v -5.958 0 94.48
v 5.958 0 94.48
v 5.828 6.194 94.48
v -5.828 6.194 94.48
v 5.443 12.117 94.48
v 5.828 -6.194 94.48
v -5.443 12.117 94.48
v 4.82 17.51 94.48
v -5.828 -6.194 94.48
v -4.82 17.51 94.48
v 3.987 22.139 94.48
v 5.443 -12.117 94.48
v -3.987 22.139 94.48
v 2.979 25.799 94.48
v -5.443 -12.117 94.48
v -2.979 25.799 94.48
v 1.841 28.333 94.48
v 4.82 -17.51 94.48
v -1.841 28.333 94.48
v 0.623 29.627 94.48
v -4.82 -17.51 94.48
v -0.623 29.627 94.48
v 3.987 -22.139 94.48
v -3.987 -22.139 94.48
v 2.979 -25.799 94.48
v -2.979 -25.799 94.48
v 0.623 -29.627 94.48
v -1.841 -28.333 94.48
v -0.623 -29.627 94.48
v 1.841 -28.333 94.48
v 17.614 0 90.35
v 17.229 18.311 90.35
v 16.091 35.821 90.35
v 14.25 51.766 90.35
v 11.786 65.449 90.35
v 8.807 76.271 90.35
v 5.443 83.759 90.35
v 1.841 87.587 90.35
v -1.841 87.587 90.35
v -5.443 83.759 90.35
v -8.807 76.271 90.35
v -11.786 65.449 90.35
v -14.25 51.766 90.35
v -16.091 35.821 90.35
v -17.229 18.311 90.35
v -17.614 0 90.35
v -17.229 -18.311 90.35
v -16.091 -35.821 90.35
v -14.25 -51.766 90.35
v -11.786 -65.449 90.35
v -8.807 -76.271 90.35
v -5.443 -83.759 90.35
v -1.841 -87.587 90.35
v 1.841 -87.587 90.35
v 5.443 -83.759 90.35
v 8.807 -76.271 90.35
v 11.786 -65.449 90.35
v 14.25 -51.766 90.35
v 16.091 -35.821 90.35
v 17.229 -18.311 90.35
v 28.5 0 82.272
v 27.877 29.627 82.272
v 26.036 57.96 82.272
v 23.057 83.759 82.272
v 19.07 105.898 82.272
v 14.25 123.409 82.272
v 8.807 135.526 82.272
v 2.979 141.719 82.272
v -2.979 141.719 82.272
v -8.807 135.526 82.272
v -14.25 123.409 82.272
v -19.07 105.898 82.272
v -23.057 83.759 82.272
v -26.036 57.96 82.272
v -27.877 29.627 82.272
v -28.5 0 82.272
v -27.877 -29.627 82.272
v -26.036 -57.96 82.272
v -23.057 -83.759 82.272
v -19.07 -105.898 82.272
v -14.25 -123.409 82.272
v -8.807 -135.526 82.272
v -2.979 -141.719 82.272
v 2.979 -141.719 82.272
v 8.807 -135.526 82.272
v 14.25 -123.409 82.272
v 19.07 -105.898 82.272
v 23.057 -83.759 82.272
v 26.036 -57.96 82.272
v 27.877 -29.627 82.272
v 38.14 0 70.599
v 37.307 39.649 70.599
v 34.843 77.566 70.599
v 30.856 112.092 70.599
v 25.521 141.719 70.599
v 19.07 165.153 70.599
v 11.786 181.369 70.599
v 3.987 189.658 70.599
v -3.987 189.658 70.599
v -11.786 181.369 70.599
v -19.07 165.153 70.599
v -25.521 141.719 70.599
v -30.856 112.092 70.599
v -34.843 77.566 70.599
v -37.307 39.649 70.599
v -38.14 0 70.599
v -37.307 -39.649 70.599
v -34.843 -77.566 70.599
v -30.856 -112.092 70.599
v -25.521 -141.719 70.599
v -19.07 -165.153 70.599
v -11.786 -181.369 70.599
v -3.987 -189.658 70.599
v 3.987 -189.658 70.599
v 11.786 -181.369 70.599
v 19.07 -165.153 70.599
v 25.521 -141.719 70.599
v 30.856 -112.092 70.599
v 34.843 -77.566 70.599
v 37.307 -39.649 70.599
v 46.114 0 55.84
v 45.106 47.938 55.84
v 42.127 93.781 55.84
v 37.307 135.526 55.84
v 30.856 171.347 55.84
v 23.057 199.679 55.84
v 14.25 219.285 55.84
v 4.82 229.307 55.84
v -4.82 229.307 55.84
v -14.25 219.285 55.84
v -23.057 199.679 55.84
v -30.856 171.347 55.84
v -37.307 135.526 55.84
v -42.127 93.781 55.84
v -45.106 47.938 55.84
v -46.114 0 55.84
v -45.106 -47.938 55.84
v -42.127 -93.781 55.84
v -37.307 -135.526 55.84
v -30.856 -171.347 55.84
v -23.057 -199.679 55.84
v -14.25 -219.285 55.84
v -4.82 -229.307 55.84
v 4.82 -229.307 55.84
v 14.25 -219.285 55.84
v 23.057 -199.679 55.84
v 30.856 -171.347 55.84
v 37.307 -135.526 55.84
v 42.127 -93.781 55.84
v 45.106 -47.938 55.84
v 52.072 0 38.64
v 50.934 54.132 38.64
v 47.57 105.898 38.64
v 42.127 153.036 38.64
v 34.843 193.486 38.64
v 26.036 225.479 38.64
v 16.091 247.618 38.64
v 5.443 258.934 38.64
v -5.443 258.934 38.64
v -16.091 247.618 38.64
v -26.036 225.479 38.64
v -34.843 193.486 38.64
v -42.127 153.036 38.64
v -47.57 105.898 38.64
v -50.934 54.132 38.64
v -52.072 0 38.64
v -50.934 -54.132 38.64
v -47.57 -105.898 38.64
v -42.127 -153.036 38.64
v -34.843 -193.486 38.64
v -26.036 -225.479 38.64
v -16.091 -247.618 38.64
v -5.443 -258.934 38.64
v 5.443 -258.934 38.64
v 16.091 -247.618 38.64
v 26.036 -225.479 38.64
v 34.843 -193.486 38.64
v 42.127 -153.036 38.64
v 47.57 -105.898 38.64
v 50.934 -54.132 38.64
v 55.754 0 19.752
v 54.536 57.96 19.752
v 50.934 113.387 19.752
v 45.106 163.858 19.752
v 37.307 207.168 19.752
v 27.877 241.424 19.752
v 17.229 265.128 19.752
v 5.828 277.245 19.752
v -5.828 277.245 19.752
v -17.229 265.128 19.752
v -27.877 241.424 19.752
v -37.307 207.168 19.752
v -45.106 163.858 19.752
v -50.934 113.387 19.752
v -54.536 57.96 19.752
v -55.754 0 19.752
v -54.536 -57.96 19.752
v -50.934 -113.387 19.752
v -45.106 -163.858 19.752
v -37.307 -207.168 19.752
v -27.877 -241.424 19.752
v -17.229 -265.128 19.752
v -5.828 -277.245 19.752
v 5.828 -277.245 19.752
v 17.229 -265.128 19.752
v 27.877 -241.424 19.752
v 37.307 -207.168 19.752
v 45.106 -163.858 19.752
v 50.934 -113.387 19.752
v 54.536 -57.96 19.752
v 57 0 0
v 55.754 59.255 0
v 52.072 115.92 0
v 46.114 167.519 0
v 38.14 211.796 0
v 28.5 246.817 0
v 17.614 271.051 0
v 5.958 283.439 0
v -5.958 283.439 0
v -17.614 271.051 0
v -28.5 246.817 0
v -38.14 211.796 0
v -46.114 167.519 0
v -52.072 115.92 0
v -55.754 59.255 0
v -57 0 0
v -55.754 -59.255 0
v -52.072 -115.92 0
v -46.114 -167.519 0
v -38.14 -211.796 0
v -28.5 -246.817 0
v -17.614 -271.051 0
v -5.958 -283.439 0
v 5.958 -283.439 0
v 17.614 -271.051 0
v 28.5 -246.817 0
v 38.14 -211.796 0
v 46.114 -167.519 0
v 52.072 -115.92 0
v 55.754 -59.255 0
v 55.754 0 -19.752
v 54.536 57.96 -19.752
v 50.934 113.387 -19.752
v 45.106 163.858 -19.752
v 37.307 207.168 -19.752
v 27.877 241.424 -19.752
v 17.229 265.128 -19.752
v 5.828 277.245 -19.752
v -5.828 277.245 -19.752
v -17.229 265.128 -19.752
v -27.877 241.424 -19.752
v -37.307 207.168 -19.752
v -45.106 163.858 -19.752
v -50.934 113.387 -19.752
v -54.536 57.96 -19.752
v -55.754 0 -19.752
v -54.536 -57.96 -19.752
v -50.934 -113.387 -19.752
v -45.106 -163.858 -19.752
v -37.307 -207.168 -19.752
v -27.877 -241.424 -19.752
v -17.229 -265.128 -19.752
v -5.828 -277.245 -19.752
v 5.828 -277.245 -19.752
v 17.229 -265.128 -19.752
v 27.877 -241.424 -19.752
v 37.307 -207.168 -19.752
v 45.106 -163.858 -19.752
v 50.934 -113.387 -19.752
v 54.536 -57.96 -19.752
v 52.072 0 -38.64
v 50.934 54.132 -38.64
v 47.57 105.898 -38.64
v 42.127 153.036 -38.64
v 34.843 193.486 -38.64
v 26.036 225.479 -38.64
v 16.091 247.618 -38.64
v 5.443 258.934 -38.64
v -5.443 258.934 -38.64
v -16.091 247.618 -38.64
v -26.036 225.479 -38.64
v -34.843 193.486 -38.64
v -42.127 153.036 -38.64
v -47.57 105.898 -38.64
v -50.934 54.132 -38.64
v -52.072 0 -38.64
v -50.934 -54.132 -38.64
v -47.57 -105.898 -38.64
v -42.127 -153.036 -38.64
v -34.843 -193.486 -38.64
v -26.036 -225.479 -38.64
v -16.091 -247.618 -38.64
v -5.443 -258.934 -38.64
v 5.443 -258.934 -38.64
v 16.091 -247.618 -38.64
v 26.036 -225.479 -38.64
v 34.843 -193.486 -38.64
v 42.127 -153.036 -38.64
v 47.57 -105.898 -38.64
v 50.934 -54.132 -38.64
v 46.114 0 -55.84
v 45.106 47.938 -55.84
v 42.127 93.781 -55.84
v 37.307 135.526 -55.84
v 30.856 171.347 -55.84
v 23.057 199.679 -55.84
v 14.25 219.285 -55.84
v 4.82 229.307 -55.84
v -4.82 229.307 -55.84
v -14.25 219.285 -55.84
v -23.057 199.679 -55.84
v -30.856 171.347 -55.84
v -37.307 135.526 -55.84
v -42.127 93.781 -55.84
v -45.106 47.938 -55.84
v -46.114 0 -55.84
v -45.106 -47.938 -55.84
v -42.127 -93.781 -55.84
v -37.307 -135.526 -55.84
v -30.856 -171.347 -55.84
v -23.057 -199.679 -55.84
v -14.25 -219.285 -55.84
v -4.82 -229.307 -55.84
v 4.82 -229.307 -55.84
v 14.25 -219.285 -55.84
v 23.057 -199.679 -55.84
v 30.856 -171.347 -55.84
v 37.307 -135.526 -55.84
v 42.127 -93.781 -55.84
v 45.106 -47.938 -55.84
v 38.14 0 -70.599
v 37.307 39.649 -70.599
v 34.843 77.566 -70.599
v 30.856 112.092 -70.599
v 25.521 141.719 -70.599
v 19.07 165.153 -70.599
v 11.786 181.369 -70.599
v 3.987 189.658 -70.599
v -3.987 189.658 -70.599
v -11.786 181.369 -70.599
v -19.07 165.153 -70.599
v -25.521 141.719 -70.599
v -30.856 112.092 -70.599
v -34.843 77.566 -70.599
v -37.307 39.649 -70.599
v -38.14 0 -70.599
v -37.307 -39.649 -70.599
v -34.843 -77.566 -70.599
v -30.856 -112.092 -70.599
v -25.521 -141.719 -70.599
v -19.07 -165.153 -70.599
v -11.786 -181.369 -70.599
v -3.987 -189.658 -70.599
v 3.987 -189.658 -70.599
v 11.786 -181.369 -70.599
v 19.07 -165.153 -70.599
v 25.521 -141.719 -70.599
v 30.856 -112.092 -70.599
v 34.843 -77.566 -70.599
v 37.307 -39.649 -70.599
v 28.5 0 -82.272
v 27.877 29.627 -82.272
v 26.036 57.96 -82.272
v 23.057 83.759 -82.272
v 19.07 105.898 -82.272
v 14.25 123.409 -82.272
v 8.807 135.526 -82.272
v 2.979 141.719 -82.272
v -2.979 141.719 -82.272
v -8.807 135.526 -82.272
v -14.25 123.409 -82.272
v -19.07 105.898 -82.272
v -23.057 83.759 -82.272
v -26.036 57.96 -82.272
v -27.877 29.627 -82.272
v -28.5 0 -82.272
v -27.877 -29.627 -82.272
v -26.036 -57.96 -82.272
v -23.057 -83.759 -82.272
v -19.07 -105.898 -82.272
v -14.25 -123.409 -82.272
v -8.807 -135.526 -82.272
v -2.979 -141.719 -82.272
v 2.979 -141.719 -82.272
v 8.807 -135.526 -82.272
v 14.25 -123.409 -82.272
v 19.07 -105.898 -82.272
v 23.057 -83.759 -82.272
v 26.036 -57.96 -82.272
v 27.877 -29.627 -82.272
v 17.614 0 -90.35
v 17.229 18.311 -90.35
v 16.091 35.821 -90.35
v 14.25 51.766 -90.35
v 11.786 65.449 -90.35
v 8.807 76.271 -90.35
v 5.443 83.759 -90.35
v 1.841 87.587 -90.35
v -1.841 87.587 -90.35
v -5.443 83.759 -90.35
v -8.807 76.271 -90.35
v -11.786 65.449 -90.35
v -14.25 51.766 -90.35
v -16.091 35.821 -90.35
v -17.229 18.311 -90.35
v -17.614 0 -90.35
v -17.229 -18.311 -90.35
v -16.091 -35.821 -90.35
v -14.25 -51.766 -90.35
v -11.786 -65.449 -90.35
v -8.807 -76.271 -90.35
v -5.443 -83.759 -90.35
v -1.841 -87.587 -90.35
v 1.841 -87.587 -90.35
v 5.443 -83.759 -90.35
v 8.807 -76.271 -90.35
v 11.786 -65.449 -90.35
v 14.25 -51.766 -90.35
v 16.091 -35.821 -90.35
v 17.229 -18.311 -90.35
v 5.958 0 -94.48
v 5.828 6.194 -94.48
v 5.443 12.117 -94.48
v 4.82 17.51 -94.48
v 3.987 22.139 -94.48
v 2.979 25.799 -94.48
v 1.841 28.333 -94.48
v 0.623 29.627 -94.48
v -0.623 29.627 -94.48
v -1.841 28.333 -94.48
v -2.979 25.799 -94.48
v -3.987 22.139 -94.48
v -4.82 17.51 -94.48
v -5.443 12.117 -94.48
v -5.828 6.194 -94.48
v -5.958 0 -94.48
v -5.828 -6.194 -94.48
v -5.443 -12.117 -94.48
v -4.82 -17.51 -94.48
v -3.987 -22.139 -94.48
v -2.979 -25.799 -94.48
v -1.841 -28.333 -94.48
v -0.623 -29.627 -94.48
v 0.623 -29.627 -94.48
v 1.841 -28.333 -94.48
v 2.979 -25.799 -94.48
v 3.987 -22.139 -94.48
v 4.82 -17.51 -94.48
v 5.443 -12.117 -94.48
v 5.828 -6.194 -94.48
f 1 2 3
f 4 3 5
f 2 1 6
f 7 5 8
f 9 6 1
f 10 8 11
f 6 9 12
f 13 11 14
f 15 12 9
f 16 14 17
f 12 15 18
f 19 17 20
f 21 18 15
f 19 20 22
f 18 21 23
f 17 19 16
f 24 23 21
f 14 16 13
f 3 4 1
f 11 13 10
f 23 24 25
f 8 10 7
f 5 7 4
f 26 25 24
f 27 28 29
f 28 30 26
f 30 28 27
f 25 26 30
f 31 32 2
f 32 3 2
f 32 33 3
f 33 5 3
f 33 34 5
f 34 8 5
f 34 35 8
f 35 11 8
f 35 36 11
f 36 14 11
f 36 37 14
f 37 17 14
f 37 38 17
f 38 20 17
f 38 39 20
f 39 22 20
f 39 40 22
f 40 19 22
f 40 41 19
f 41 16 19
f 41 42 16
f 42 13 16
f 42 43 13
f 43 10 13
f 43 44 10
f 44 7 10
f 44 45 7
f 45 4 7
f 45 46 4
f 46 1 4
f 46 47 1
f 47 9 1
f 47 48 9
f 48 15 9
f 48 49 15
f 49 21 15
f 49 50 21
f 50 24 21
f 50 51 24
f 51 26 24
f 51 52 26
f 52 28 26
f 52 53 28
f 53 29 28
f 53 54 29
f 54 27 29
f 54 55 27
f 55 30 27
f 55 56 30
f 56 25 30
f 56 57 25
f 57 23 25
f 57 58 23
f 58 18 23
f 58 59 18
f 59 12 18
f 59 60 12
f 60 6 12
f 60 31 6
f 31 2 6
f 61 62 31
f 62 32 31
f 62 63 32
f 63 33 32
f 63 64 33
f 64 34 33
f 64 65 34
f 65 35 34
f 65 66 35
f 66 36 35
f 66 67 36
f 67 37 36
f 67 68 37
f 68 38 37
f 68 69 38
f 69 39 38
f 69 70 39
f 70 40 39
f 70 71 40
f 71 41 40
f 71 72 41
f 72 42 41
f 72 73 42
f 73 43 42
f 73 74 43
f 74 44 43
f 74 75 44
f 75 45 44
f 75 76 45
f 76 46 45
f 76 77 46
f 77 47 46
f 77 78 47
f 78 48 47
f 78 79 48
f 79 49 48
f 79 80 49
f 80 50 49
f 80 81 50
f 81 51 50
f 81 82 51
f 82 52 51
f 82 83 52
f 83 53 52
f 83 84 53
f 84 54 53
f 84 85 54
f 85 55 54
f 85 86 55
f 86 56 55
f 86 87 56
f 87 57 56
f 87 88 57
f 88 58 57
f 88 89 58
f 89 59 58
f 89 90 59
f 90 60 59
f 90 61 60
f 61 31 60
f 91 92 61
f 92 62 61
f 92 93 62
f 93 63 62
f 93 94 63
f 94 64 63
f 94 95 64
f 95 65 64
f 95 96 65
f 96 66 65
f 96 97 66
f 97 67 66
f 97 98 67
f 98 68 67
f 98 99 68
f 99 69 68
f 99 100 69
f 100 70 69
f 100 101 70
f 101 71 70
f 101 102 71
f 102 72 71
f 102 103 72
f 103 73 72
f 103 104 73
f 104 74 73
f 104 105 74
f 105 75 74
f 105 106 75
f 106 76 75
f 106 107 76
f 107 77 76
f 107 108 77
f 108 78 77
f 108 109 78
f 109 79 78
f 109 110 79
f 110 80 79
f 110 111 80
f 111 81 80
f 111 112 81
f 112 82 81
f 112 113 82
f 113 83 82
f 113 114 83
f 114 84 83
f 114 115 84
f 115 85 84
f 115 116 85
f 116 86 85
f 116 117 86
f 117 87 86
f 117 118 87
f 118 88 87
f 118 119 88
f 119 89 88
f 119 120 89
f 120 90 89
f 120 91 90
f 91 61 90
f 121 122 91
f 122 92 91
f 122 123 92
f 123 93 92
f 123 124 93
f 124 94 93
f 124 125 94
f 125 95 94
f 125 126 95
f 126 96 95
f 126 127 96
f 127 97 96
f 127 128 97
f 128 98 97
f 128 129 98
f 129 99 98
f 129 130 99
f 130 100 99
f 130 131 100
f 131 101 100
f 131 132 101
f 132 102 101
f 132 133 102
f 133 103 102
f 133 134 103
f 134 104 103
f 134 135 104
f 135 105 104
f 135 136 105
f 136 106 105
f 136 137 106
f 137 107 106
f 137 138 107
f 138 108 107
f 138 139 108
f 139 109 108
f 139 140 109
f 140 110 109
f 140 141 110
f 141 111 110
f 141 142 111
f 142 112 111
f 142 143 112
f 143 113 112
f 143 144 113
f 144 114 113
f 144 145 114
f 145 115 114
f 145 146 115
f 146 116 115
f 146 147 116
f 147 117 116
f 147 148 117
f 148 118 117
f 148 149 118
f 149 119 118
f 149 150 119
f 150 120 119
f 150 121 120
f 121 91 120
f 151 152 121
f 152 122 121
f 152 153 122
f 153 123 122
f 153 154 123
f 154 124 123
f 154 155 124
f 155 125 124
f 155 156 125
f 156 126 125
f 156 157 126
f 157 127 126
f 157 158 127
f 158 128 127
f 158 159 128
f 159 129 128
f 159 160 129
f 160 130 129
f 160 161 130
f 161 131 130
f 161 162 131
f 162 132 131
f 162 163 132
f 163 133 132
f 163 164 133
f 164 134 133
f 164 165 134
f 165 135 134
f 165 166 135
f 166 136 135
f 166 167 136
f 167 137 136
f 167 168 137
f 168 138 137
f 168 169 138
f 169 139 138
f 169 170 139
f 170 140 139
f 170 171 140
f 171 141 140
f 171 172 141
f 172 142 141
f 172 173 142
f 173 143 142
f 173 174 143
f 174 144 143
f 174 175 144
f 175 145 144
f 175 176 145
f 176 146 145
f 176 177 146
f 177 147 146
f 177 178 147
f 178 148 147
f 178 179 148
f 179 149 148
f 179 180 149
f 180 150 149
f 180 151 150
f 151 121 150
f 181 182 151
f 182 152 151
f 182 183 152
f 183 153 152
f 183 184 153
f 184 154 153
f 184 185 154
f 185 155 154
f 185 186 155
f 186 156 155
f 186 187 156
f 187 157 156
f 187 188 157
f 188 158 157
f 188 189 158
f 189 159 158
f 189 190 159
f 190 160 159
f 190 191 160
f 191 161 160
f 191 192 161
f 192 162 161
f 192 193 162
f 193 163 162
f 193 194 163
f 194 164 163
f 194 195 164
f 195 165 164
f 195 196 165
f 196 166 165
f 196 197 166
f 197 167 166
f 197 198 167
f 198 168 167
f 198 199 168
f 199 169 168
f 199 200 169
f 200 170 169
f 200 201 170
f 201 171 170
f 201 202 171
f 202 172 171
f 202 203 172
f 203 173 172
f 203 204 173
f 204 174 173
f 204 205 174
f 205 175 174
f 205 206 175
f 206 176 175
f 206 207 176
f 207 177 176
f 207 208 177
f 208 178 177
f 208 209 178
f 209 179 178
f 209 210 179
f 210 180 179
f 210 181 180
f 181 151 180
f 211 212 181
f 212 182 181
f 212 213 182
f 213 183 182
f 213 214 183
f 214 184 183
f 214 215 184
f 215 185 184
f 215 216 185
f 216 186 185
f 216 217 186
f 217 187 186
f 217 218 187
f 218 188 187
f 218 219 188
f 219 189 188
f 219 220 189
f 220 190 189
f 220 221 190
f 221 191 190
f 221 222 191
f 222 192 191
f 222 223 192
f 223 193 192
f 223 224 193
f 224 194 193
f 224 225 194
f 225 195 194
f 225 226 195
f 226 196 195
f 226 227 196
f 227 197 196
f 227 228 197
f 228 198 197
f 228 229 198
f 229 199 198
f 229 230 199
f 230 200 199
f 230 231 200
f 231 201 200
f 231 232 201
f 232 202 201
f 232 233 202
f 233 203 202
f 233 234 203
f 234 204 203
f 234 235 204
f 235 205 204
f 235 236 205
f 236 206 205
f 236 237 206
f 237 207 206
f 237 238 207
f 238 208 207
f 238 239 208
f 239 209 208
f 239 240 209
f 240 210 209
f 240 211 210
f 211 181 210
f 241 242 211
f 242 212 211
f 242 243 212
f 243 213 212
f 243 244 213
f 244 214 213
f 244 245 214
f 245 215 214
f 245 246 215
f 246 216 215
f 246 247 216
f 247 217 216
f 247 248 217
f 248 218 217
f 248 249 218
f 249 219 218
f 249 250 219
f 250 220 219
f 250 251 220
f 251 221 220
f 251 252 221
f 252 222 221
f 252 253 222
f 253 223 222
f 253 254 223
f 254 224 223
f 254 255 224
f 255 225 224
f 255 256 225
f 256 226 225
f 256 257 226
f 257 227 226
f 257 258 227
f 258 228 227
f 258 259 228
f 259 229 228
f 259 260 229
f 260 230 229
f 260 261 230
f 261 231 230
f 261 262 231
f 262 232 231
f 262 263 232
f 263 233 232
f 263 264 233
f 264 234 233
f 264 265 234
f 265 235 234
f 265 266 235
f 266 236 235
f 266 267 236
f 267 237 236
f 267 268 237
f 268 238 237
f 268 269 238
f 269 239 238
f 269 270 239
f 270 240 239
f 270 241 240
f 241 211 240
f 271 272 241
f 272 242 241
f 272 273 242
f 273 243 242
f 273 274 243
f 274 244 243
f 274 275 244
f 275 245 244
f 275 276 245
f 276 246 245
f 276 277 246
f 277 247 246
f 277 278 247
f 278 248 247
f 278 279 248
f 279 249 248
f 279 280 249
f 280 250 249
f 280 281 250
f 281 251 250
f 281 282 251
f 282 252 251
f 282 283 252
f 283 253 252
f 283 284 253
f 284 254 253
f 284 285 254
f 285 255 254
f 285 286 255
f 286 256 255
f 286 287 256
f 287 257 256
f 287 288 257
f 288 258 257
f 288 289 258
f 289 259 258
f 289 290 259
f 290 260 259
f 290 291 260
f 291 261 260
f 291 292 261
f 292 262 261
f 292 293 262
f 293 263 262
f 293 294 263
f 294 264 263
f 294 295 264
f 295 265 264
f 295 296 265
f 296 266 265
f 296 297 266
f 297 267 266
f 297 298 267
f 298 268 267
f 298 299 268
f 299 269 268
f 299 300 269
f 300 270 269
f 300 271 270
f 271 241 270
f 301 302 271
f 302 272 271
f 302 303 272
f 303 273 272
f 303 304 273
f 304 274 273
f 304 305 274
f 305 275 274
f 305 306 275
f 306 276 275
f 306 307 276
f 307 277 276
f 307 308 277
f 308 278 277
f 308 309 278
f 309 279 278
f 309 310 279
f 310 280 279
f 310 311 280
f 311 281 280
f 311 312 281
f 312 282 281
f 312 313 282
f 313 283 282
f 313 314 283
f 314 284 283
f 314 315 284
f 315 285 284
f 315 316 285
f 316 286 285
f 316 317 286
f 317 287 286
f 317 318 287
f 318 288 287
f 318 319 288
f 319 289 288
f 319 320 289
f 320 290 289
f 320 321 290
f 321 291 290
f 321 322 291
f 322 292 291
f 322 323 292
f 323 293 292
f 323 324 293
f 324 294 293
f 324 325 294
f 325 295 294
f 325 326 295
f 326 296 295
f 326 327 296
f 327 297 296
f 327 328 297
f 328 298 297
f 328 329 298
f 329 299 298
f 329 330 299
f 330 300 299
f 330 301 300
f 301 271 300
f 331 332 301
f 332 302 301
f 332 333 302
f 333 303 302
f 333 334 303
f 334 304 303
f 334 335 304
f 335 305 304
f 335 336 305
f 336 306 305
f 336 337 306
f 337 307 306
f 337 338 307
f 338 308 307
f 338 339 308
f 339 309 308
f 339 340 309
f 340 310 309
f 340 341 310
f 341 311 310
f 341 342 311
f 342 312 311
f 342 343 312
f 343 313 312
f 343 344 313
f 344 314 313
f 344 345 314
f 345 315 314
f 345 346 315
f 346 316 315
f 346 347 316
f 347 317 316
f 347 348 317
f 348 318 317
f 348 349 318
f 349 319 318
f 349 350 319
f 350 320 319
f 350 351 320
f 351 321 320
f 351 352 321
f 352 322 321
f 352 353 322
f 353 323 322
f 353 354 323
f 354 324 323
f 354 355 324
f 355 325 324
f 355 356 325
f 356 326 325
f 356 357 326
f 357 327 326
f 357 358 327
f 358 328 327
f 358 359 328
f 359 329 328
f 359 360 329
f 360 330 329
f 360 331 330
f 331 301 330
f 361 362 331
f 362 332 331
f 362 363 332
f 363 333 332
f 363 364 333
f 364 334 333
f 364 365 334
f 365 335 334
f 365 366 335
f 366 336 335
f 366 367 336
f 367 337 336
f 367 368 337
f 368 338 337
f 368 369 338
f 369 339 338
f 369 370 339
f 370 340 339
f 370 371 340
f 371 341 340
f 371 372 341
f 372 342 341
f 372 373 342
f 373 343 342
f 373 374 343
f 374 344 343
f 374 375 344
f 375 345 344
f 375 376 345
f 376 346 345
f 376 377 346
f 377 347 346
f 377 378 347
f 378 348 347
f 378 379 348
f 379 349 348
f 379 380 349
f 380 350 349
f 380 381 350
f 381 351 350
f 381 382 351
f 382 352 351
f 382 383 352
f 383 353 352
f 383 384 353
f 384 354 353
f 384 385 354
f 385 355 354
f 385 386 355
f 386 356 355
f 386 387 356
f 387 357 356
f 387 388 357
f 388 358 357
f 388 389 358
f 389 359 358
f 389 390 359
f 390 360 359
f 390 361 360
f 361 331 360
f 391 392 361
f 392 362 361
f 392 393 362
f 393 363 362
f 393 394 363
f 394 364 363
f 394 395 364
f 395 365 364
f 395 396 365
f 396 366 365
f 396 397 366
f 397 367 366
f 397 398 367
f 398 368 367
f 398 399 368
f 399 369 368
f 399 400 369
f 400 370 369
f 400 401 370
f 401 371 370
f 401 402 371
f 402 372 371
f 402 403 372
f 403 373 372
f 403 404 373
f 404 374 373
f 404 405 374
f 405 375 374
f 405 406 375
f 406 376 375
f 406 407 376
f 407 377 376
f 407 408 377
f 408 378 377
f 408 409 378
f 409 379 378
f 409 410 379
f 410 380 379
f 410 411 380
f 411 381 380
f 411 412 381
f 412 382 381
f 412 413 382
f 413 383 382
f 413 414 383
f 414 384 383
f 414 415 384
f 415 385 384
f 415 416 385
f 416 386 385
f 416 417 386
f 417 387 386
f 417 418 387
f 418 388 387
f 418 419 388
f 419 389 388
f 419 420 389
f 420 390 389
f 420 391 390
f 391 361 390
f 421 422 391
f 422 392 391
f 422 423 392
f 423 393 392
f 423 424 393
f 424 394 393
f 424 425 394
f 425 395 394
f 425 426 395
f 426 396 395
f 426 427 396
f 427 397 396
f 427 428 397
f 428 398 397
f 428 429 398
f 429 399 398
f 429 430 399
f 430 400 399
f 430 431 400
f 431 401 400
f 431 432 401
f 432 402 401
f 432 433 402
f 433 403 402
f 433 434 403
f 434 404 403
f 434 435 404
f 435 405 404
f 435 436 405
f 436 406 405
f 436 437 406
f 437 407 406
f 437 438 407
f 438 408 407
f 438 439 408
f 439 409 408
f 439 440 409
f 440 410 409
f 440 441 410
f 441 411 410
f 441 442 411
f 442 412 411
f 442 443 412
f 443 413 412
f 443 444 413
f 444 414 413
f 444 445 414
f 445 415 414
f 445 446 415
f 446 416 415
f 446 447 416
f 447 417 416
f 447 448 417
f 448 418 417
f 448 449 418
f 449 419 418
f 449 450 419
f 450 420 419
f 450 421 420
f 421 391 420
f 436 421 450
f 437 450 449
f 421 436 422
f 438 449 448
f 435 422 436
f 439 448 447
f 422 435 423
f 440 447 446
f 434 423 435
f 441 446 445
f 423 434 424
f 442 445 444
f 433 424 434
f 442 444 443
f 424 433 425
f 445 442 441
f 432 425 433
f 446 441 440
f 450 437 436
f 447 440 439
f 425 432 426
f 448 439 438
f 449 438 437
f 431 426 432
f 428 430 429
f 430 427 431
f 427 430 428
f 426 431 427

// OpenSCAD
// Generated by SolidPython 1.0.1 on 2020-07-29 00:46:45


scale(v = [3, 15, 5]) {
	sphere(r = 19);
}
/***********************************************
*********      SolidPython code:      **********
************************************************
 
# import packages: SolidPython
from solid import *
from solid.utils import *
from itertools import chain, combinations, permutations


class Resize:

    def __init__(self, scad_file):
        self.scad_file = scad_file
        #self.scad_file = import_scad(scad_file)
        # cone/cylinder param:
        self.r1 = 0
        self.r2 = 0
        self.h = 0
        # rectangular prism param:
        self.w = 0
        self.l = 0
        # ellipse param:
        self.r = 0

    # import OpenScad code (file name corresponds to shape)


    # classify shape + parameters
    def assign(self, param1, param2, param3):
        if self.scad_file == 'cone.scad':
            self.r1 = param1
            self.r2 = param2
            self.h = param3
        elif self.scad_file == 'cylinder.scad':
            self.r1 = param1
            self.r2 = param2
            self.h = param3
        elif self.scad_file == 'rectangularPrism.scad':
            self.h = param1
            self.l = param2
            self.w = param3
        else:
            self.r = param1
            self.h = param2

    # resize parameters
    def iterate(self):
        x = range(3, 20, 2)
        i = 1
        if self.scad_file == 'cone.scad':
            tempList = list(permutations(x, 2))
            for temp in tempList:
                param1 = temp[0]
                param2 = temp[1]
                filepath = 'produced_scad_files/' + 'cone' + str(param1) + '_' + str(param2) + '_' + '.scad'
                scad_render_to_file(cylinder(h=param1, r1=param2, r2=0), filepath)

        elif self.scad_file == 'cylinder.scad':
            tempList = list(permutations(x, 3))
            for temp in tempList:
                param1 = temp[0]
                param2 = temp[1]
                filepath = 'produced_scad_files/' + 'cylinder' + str(param1) + '_' + str(param2) + '_' + '.scad'
                scad_render_to_file(cylinder(h=param1, r1=param2, r2=param2), filepath)

        elif self.scad_file == 'rectangularPrism.scad':
            tempList = list(permutations(x, 3))
            for temp in tempList:
                param1 = temp[0]
                param2 = temp[1]
                param3 = temp[2]
                filepath = 'produced_scad_files/' + 'rectangularPrism' + str(param1) + '_' + str(param2) + '_' + str(
                    param3) + '.scad'
                scad_render_to_file(cube(size=(param1, param2, param3)), filepath)

        elif self.scad_file == 'ellipse.scad':
            tempList = list(permutations(x, 4))
            for temp in tempList:
                param1 = temp[0]
                param2 = temp[1]
                param3 = temp[2]
                param4 = temp[3]
                filepath = 'produced_scad_files/' + 'ellipse' + str(param1) + '_' + str(param2) + '_' + str(param3) + '_' + str(param4) + '.scad'
                scad_render_to_file(scale([param1, param2, param3])(sphere(r=param4)), filepath)

    def render_to_scadfile(self):
        scad_render_to_file(scad, 'example.scad') 
 
************************************************/
